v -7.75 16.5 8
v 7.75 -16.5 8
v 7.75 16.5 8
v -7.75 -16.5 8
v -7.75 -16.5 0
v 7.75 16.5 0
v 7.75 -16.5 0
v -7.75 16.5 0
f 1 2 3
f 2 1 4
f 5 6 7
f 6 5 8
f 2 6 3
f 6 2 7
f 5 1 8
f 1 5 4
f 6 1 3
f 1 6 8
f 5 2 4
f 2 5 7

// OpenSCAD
module servo_space(add=0){
thickness=1.5;
thickness2=5;
w=12.5;
d=23;
wires_spacing=1.4;
wires_w=4.5;
h=8;

 a=d+2*thickness2+add; b=w+2*thickness; c=10;
 translate([-b/2,-a/2,0])cube([b,a,h]);
}

module servo_holder(){
thickness=1.5;
thickness2=5;
w=12.5;
d=23;
wires_spacing=1.4;
wires_w=4.5;
h=8;
translate([-w/2-thickness,-d/2-thickness2,0])difference(){
  cube([w+2*thickness, d+2*thickness2,h]);
  union(){
    translate([thickness,thickness2,-1])cube([w,d,h+2]);
    translate([thickness+w/2,thickness2/2,h-8])cylinder(d=2,h=8,$fn=20);
    translate([thickness+w/2,d+thickness2*1.5,h-8])cylinder(d=2,h=8,$fn=20);
    translate([thickness+w/2,thickness2-wires_spacing,0])
      translate([-wires_w/2,0,0])color([1,0,0])cube([wires_w,wires_spacing,h]);
    translate([thickness+w/2,d+thickness2,0])
      translate([-wires_w/2,0,0])color([1,0,0])cube([wires_w,wires_spacing,h]);
  }
}
}
servo_holder();

servo_space();
